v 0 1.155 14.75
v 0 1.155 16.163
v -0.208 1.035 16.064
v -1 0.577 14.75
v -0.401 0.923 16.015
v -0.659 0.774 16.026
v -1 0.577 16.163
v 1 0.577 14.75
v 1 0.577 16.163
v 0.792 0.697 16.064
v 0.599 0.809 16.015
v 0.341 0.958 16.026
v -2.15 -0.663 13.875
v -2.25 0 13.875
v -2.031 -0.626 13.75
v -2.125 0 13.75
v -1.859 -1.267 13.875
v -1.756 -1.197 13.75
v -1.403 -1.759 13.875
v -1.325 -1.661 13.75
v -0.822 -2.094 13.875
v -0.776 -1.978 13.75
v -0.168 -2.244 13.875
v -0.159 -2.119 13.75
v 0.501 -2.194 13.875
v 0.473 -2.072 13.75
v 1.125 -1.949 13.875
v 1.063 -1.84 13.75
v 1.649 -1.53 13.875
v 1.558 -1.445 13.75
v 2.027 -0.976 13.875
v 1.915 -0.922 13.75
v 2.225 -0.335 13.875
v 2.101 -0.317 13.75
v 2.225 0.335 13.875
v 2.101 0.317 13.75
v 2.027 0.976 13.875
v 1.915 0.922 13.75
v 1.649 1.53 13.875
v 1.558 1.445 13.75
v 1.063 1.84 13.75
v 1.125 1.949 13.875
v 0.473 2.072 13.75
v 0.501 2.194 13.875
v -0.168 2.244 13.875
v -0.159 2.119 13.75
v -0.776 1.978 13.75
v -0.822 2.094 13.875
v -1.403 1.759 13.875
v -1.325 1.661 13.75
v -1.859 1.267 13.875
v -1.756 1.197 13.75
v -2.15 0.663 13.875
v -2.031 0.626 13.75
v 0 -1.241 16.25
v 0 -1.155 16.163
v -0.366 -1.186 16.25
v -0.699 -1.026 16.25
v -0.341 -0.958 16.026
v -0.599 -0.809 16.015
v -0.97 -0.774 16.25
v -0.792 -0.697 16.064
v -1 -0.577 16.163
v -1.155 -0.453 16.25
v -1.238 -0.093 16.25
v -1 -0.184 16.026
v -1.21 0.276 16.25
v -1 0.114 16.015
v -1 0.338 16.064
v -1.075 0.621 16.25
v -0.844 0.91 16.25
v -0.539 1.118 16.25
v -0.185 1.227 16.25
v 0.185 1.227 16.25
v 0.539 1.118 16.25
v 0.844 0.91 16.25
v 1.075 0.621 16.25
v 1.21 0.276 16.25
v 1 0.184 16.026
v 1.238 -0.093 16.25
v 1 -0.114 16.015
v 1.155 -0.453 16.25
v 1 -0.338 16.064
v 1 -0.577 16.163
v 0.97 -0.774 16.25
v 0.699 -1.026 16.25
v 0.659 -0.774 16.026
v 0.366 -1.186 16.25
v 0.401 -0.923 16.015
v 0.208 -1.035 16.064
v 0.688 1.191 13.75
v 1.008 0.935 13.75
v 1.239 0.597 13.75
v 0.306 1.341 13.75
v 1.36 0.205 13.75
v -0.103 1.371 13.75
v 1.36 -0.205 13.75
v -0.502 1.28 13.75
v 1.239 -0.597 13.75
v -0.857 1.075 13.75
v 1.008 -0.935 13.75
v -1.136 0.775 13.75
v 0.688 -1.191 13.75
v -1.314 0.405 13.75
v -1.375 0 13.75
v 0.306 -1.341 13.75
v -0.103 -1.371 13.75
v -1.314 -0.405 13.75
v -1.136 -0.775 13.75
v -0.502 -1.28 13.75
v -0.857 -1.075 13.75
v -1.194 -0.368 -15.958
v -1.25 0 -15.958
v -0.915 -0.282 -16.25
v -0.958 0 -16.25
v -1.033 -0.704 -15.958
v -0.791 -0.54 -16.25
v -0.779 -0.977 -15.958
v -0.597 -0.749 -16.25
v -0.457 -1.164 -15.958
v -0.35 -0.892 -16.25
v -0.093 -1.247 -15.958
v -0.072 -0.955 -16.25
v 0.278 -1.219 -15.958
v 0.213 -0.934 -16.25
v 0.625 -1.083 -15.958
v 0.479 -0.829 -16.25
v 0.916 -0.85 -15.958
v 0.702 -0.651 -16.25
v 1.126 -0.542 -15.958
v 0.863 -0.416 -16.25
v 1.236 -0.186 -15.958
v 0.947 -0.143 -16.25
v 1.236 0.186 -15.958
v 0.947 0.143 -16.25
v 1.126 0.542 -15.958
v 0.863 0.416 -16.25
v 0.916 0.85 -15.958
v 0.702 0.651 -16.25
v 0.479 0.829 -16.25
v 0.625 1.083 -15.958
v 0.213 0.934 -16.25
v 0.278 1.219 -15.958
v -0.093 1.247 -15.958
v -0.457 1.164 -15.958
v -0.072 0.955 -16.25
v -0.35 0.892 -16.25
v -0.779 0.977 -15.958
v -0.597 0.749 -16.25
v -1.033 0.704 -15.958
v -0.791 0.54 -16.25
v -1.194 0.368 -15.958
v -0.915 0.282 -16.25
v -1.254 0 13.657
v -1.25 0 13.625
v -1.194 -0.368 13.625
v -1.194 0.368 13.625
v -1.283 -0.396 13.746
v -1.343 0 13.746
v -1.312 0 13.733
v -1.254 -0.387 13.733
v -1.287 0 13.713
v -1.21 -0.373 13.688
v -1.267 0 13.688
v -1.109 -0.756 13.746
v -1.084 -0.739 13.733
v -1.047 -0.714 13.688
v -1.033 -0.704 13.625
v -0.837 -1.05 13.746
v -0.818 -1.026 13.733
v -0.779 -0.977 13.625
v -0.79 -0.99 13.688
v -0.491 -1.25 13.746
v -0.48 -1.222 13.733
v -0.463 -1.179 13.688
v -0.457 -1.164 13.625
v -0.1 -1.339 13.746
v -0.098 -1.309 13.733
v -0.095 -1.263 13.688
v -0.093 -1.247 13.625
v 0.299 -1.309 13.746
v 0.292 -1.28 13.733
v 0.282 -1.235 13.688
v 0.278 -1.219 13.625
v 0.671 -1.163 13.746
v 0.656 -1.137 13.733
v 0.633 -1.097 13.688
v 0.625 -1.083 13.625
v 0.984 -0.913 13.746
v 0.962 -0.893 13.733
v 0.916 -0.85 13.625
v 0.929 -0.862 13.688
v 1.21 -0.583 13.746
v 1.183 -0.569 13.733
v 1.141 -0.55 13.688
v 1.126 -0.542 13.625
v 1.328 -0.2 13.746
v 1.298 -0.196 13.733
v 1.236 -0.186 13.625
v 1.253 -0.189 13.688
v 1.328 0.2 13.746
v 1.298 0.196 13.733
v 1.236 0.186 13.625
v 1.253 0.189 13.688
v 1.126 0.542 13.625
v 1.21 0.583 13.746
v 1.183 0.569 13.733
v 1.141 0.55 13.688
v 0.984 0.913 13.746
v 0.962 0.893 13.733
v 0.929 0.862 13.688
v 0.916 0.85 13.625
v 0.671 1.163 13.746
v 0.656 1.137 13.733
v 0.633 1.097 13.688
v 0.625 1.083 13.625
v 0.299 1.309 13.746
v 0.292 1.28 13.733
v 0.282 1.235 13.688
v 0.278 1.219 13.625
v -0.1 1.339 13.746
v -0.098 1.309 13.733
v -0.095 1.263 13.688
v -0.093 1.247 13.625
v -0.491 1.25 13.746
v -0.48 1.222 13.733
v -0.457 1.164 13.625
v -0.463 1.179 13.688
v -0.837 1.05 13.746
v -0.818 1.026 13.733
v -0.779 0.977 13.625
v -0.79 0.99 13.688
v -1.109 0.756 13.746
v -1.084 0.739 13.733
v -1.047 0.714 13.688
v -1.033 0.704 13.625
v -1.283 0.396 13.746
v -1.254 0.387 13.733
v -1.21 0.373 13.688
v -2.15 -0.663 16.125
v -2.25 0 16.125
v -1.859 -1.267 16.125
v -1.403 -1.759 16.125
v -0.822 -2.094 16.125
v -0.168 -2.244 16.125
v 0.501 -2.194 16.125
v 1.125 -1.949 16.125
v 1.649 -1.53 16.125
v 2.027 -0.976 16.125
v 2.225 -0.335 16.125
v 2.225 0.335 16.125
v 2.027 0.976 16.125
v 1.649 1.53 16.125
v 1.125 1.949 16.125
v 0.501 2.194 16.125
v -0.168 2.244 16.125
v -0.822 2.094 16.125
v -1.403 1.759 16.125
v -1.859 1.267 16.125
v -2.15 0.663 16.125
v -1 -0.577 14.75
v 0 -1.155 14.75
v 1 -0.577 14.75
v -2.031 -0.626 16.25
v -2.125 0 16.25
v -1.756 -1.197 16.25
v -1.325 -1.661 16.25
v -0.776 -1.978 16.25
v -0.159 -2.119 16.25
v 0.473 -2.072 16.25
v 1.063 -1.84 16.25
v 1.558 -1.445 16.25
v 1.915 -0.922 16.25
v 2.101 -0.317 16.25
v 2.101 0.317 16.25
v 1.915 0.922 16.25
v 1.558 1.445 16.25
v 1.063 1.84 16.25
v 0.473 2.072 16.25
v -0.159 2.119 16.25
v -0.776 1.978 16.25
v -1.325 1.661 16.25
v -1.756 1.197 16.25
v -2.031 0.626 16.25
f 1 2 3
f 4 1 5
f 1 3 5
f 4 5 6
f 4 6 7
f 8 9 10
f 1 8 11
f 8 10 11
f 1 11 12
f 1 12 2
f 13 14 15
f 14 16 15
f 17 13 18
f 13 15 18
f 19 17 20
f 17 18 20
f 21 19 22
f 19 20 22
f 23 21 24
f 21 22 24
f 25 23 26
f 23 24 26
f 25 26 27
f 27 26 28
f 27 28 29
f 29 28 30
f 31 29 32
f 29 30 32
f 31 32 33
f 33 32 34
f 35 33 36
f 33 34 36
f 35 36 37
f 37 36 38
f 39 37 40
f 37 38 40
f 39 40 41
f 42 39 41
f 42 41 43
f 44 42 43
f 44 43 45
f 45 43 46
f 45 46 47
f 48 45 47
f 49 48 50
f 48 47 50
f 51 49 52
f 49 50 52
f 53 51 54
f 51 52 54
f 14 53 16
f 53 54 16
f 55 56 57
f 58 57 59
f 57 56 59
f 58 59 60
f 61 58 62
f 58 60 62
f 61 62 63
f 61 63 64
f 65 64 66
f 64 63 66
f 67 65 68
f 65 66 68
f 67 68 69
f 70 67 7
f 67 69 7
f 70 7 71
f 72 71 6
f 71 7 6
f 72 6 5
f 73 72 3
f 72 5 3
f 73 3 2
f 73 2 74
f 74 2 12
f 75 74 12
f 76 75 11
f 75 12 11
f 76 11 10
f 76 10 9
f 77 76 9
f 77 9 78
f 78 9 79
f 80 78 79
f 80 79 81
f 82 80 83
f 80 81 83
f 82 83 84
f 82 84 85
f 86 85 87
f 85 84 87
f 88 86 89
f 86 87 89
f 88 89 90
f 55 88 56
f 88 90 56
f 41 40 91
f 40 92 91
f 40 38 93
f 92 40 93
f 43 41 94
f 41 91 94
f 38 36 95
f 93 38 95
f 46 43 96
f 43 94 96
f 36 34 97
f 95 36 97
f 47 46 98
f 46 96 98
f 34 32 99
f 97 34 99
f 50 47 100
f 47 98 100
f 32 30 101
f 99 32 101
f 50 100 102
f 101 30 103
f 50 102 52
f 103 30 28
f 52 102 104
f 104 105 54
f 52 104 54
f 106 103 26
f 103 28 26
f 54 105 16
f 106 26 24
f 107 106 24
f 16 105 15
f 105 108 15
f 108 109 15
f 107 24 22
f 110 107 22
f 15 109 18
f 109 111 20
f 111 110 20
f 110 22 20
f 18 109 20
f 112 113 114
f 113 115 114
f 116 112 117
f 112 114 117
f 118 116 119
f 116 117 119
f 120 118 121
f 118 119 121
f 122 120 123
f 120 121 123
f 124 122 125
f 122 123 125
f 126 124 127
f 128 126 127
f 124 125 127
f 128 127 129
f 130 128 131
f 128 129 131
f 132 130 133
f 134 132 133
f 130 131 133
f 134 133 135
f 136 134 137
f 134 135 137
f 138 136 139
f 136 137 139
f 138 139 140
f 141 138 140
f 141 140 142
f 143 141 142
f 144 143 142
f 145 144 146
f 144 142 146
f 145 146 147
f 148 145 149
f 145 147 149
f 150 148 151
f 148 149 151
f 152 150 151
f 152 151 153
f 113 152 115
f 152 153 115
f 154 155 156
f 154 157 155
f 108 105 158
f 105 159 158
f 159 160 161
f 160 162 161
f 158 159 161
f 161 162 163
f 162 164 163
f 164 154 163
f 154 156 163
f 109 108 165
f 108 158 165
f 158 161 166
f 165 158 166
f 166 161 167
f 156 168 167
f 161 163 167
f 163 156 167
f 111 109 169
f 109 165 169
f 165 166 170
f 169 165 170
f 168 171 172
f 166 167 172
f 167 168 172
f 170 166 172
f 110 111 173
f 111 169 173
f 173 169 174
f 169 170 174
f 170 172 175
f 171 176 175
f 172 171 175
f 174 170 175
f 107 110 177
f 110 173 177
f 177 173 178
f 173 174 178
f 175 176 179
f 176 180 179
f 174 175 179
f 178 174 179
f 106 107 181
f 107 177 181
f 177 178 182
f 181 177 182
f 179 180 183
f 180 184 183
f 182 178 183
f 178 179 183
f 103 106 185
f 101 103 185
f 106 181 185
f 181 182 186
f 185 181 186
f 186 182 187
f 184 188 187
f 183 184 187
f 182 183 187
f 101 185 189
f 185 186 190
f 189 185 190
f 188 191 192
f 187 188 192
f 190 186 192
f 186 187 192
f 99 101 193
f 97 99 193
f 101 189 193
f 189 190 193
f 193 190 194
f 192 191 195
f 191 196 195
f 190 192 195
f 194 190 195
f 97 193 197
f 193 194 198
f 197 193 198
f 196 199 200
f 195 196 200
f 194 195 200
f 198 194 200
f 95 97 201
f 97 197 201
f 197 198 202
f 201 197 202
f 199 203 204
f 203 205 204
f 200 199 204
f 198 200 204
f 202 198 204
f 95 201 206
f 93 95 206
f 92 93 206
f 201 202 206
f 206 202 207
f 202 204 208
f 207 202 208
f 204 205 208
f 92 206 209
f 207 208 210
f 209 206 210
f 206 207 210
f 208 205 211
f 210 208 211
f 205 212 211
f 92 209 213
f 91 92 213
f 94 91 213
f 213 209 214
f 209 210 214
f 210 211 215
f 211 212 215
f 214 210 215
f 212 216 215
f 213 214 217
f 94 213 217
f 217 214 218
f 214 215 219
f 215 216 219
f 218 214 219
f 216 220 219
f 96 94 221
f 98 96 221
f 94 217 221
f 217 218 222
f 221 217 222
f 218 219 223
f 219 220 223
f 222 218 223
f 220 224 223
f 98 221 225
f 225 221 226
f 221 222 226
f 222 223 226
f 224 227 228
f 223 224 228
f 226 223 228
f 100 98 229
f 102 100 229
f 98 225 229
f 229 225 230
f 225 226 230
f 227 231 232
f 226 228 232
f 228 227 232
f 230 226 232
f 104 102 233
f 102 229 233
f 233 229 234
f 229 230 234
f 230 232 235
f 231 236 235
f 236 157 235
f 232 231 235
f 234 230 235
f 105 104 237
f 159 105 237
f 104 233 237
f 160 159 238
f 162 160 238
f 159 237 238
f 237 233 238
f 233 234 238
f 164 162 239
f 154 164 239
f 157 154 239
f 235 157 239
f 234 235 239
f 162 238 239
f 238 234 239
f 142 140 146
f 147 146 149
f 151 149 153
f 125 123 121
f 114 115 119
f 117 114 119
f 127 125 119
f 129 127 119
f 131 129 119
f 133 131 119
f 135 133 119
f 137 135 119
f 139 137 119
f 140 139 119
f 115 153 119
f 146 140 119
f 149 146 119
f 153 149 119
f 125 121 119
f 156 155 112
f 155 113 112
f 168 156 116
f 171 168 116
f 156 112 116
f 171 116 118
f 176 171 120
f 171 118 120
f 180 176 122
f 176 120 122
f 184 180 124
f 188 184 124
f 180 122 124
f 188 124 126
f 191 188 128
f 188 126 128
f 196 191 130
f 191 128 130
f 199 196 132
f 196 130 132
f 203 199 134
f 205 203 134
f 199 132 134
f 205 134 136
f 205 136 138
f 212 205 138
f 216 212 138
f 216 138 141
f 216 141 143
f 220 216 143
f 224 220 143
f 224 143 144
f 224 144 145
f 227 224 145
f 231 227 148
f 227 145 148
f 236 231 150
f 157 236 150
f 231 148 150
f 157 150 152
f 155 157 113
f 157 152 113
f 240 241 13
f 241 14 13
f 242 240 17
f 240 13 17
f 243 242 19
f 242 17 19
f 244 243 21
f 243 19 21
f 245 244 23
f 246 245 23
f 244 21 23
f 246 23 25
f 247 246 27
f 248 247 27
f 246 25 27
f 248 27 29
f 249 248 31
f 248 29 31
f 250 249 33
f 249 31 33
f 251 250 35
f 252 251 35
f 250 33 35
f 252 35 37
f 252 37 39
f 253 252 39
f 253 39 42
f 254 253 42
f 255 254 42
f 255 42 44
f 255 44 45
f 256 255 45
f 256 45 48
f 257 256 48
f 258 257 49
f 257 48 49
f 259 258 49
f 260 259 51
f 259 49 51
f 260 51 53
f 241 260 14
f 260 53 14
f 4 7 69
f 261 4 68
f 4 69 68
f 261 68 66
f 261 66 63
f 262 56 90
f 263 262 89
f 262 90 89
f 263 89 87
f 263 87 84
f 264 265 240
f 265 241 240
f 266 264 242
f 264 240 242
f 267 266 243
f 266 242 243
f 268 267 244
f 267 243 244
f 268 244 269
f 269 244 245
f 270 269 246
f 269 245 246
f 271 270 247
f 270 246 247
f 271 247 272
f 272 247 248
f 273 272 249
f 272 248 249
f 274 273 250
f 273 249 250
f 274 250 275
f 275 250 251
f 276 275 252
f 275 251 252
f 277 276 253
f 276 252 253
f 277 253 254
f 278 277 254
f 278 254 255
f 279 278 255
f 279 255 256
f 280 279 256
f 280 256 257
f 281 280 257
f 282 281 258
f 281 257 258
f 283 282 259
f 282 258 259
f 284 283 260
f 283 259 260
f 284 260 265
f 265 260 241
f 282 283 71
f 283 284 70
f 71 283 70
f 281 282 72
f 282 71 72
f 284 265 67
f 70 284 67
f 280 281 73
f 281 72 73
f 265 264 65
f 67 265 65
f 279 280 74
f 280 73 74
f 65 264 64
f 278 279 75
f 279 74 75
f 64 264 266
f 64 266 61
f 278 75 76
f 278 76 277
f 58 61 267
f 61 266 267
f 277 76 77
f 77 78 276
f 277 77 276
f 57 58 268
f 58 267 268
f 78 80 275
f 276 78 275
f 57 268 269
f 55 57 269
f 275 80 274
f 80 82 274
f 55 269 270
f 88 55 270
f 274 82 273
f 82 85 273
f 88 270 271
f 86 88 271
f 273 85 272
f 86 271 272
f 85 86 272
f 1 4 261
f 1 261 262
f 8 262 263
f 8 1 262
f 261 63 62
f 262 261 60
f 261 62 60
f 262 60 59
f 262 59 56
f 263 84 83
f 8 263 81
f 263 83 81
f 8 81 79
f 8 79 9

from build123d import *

# Parameters (mm, degrees)
CUT_EXTRUDE1_DEPTH = 1.5


with BuildPart() as part:
    # Sketch2 → Revolve1 (revolve)
    with BuildSketch(Plane(origin=(0, 0, 0), x_dir=(0, 0, -1), z_dir=(1, 0, 0)), mode=Mode.PRIVATE) as revolve1_sk:
        with BuildLine():
            Line((-16.25, 0), (-16.25, 2.125))
            Line((-16.25, 2.125), (-16.125, 2.25))
            Line((-16.125, 2.25), (-13.875, 2.25))
            Line((-13.875, 2.25), (-13.75, 2.125))
            Line((-13.75, 2.125), (-13.75, 1.375))
            ThreePointArc((-13.75, 1.375), (-13.713388348, 1.286611652), (-13.625, 1.25))
            Line((-13.625, 1.25), (15.957716426, 1.25))
            Line((15.957716426, 1.25), (16.25, 0.957716426))
            Line((16.25, 0.957716426), (16.25, 0))
            Line((16.25, 0), (-16.25, 0))
        make_face()
    revolve(revolve1_sk.sketch.rotate(Axis((0, 0, -16.25), (0, 0, 1)), 90), axis=Axis((0, 0, -16.25), (0, 0, 1)))

    # Sketch3 → Cut-Extrude1 (cut)
    with BuildSketch(Plane.XY.offset(16.25)):
        Polygon((1, -0.577350269), (1, 0.577350269), (0, 1.154700538), (-1, 0.577350269), (-1, -0.577350269), (0, -1.154700538), align=None)
    extrude(amount=-CUT_EXTRUDE1_DEPTH, mode=Mode.SUBTRACT)

    # Cut-Extrude2 cone 1 section (through the dimple's axis) → Cut-Extrude2 (revolve, cut)
    with BuildSketch(Plane(origin=(0, 0, 16.25), x_dir=(0, -1, 0), z_dir=(1, 0, 0))):
        Polygon((0, 0), (1.241303079, 0), (0, 1.241303079), align=None)
    revolve(axis=Axis((0, 0, 16.25), (0, 0, -1)), mode=Mode.SUBTRACT)


solid = part.part
